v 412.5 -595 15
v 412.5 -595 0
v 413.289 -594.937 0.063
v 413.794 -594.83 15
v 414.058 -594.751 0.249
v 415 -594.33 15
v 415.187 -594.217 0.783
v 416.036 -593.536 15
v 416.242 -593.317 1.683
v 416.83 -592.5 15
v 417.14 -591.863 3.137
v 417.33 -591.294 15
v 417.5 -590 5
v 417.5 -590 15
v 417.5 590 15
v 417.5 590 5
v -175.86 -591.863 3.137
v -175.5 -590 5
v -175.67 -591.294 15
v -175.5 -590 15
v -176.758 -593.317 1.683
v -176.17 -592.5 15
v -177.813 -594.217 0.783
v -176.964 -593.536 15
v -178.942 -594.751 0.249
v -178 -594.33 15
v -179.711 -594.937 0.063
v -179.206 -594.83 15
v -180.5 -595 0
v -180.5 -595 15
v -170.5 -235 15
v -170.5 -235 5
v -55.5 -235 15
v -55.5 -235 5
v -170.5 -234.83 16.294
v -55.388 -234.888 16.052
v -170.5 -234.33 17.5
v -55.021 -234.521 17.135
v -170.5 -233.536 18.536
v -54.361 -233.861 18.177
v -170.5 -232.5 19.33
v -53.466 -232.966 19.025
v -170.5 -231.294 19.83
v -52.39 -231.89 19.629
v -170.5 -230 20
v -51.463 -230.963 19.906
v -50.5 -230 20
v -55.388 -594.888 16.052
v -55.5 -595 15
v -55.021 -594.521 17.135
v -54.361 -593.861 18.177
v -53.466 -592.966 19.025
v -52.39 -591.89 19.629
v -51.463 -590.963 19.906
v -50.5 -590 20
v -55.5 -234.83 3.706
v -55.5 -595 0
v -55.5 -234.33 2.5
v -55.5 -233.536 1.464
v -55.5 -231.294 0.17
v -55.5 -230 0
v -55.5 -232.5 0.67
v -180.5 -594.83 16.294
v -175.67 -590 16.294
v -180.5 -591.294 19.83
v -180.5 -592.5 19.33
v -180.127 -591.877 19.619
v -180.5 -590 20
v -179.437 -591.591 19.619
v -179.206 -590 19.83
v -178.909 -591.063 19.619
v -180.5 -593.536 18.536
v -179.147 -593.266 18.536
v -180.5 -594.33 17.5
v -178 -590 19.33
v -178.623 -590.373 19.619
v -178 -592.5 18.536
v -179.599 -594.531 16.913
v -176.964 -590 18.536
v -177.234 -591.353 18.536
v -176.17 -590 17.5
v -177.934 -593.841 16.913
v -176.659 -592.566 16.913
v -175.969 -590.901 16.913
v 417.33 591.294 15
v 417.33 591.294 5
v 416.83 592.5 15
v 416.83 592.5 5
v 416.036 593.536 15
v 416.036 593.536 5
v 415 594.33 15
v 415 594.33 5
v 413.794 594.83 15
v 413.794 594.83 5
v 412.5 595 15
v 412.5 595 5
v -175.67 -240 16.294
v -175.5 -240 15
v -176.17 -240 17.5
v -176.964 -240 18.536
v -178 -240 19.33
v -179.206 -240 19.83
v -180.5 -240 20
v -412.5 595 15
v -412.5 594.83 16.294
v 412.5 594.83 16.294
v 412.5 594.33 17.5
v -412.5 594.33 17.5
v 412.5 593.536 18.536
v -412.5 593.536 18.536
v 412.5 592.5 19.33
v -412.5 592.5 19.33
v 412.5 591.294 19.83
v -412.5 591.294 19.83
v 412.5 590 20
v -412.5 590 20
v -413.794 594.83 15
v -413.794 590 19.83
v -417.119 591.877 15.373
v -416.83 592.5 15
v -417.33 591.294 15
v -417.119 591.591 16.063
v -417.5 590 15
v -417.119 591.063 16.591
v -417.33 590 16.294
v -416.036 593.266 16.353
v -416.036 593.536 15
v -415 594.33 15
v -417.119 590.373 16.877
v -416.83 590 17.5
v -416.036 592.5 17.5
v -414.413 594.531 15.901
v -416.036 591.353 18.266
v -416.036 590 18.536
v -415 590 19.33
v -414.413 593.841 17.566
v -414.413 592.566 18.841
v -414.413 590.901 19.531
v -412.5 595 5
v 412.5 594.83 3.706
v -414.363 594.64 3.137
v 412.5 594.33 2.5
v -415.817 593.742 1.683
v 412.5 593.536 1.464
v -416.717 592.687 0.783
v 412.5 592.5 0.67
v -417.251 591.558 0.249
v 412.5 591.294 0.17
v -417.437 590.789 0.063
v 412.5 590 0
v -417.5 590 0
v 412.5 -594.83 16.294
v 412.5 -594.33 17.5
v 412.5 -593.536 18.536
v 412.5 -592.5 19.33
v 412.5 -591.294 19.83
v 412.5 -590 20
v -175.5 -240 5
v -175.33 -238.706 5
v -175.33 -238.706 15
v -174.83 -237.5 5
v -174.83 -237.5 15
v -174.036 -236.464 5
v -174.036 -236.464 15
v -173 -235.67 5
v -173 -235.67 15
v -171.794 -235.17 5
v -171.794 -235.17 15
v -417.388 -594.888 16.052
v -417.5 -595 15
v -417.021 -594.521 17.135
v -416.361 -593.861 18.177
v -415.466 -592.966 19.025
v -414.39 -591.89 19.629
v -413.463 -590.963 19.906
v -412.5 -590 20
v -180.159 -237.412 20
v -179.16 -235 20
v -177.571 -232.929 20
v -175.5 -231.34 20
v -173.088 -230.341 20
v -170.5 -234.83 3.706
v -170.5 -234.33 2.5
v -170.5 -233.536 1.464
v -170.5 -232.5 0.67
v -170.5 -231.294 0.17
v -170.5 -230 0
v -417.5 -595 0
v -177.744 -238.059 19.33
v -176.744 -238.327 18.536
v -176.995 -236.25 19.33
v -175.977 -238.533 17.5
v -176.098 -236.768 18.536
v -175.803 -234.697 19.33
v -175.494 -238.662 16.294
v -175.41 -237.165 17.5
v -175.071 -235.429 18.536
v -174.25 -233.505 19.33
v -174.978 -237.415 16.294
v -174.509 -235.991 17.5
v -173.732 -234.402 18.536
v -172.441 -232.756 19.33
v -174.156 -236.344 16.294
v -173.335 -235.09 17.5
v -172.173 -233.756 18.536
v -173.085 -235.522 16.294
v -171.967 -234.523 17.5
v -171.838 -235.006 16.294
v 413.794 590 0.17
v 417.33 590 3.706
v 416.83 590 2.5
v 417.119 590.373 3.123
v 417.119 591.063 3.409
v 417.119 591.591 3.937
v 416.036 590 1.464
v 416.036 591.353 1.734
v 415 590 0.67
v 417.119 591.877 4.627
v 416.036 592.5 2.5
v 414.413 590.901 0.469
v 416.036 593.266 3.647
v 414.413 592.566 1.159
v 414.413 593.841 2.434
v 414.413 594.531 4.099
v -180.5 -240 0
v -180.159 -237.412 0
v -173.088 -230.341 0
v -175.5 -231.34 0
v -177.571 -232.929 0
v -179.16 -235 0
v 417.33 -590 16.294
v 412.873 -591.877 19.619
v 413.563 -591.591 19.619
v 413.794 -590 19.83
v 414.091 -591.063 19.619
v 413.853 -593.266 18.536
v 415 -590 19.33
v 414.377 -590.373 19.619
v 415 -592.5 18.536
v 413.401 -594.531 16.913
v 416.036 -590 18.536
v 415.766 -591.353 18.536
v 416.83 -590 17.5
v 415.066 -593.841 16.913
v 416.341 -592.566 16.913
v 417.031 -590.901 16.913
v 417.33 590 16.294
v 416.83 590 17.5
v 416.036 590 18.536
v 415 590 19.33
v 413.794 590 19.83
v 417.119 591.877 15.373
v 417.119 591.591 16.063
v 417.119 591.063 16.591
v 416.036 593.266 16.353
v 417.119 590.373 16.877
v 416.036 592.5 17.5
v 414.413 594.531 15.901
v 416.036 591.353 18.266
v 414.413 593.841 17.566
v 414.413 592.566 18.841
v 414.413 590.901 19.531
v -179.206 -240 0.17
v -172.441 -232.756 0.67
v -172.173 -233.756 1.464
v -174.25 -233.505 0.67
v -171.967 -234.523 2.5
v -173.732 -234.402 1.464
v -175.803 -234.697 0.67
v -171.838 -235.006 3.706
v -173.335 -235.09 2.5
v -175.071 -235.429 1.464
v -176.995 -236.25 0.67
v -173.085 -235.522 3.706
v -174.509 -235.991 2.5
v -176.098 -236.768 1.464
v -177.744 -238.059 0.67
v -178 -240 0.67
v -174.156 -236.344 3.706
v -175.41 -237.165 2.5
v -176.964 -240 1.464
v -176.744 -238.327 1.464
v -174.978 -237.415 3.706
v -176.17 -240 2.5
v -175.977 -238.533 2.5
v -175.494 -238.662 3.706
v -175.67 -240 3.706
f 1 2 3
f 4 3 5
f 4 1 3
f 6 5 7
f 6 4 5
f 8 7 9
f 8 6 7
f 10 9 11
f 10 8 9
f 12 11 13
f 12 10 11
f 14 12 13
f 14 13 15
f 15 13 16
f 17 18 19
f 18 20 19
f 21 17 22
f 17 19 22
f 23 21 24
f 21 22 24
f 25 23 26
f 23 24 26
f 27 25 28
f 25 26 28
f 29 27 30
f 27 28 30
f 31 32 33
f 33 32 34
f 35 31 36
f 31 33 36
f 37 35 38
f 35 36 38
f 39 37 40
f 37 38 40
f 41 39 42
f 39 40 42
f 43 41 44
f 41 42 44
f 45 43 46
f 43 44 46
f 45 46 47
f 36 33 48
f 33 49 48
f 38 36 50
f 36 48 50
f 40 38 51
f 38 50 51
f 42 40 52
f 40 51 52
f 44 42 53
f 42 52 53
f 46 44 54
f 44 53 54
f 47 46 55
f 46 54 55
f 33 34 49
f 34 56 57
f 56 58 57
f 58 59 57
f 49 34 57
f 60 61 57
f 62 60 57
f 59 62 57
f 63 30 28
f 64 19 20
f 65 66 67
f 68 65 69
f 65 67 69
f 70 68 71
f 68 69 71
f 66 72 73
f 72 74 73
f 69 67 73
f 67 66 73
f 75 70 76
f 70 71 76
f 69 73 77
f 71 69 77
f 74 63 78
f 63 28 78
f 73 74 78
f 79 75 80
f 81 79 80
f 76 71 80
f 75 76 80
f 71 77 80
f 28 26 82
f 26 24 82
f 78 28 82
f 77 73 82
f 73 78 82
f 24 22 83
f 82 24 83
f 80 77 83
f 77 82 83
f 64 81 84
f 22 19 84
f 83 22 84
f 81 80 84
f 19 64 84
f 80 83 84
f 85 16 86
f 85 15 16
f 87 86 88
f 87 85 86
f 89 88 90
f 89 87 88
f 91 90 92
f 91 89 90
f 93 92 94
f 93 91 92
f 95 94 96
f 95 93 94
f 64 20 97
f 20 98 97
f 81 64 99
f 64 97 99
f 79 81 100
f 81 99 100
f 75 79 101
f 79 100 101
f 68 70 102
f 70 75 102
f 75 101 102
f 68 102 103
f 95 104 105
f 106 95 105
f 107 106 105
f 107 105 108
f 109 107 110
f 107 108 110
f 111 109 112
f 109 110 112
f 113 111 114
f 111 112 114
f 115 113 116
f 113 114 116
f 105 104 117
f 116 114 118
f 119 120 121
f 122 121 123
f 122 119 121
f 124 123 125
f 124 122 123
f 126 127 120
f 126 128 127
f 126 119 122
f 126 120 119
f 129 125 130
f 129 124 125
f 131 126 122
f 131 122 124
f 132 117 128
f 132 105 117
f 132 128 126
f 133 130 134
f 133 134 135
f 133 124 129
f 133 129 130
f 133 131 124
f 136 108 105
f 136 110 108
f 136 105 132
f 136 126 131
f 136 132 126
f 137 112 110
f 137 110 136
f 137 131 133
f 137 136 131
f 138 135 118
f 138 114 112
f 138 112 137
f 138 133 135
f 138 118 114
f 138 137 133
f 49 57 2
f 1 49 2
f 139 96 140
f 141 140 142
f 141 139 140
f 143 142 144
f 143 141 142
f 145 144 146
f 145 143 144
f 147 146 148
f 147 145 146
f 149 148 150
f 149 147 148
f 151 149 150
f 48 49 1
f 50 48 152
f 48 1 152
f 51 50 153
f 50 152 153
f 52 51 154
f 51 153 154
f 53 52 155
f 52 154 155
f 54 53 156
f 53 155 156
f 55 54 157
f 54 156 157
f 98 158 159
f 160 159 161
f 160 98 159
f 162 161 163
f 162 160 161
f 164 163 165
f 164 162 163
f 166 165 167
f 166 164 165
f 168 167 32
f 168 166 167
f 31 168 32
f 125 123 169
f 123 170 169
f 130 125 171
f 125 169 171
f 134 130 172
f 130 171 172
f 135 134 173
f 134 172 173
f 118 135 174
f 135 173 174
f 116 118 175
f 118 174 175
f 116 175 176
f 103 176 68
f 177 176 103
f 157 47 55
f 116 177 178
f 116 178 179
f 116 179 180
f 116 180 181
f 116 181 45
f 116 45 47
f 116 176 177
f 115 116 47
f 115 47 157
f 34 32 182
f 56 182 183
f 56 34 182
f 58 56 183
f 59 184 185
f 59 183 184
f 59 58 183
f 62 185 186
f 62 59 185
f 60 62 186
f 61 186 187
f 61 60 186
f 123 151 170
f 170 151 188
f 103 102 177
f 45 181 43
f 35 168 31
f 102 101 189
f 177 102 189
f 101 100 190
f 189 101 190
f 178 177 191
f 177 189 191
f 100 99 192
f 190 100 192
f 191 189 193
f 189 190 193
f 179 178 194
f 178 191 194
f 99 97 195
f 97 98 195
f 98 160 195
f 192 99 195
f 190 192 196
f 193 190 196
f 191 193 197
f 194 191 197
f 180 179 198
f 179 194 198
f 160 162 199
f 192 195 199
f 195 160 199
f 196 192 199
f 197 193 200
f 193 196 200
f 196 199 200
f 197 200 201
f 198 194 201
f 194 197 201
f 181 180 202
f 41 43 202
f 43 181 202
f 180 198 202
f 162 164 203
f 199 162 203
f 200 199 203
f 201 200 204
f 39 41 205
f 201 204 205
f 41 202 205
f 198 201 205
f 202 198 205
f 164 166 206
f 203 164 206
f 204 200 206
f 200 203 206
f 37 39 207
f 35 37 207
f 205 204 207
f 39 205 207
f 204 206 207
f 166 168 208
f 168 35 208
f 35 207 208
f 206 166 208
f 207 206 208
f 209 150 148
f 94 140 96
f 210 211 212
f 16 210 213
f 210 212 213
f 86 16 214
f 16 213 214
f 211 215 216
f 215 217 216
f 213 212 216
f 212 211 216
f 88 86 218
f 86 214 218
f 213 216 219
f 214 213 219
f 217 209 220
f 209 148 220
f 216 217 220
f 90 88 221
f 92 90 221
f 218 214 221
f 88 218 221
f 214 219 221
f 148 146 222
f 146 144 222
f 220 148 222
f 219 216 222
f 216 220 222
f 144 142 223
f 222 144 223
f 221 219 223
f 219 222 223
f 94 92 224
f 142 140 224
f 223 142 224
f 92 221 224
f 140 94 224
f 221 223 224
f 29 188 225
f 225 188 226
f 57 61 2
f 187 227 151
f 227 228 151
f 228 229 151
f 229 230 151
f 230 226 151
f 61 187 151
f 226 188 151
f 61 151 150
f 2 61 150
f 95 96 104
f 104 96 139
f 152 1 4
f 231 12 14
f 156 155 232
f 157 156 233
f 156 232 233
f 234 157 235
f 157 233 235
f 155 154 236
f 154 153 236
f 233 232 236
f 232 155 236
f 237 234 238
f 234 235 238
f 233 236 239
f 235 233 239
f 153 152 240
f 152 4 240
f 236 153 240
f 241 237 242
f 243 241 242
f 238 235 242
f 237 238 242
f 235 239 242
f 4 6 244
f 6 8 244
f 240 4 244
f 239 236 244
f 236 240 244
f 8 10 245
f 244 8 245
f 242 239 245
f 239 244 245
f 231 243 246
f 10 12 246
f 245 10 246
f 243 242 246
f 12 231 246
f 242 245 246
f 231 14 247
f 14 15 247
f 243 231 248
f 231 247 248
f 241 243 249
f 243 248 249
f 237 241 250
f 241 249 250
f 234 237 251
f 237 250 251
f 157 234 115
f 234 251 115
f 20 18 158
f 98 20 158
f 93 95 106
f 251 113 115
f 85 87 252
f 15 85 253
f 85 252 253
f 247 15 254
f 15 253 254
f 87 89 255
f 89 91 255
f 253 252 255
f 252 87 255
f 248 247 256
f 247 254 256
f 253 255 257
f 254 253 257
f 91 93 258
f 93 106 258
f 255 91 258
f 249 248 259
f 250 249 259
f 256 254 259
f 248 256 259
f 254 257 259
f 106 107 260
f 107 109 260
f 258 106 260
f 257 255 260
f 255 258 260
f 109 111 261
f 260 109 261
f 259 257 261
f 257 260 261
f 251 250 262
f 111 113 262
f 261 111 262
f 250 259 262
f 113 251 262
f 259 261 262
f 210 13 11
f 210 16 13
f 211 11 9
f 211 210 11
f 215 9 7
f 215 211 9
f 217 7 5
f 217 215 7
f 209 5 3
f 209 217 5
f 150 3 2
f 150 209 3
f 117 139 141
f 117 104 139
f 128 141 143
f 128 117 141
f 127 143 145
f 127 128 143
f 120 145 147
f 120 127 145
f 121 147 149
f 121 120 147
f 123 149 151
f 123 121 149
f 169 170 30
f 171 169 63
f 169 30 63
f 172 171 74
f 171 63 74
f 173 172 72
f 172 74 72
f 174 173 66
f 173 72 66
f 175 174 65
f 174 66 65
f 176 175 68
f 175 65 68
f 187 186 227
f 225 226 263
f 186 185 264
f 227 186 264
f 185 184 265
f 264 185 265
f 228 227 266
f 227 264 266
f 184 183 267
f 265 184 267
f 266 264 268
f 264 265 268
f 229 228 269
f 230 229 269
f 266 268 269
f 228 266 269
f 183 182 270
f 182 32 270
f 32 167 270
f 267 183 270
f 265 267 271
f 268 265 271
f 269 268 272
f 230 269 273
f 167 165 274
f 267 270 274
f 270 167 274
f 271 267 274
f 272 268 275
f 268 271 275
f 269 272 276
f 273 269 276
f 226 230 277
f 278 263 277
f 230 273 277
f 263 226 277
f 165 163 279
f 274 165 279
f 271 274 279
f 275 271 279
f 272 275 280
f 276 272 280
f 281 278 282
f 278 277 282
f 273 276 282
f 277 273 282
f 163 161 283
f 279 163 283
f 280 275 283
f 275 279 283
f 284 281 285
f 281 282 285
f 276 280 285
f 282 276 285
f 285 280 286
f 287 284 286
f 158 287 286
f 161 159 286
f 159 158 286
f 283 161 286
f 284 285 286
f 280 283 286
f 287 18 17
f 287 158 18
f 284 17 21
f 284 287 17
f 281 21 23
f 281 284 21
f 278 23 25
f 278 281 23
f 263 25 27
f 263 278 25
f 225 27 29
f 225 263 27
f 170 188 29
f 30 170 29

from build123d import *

# Parameters (mm, degrees)
BOSS_EXTRUDE1_DEPTH = 20
FILLET1_R           = 5


with BuildPart() as part:
    # Sketch1 → Boss-Extrude1 (new body)
    with BuildSketch(Plane.XY):
        Polygon((-175.5, -595), (-175.5, -235), (-55.5, -235), (-55.5, -595), (417.5, -595), (417.5, 595), (-417.5, 595), (-417.5, -595), align=None)
    extrude(amount=BOSS_EXTRUDE1_DEPTH)

    # Fillet1
    fillet1_edges = [part.edges().sort_by_distance(p)[0] for p in [
        (0, 595, 0),
        (417.5, 0, 0),
        (0, 595, 20),
        (-175.5, -235, 10),
        (-175.5, -595, 10),
        (-417.5, 595, 10),
        (417.5, 595, 10),
        (417.5, -595, 10),
        (-417.5, 0, 20),
        (-296.5, -595, 20),
        (-175.5, -415, 20),
        (-115.5, -235, 20),
        (-55.5, -415, 20),
        (181, -595, 20),
        (417.5, 0, 20),
        (-115.5, -235, 0),
        (-175.5, -415, 0),
    ]]
    fillet(fillet1_edges, radius=FILLET1_R)


solid = part.part
